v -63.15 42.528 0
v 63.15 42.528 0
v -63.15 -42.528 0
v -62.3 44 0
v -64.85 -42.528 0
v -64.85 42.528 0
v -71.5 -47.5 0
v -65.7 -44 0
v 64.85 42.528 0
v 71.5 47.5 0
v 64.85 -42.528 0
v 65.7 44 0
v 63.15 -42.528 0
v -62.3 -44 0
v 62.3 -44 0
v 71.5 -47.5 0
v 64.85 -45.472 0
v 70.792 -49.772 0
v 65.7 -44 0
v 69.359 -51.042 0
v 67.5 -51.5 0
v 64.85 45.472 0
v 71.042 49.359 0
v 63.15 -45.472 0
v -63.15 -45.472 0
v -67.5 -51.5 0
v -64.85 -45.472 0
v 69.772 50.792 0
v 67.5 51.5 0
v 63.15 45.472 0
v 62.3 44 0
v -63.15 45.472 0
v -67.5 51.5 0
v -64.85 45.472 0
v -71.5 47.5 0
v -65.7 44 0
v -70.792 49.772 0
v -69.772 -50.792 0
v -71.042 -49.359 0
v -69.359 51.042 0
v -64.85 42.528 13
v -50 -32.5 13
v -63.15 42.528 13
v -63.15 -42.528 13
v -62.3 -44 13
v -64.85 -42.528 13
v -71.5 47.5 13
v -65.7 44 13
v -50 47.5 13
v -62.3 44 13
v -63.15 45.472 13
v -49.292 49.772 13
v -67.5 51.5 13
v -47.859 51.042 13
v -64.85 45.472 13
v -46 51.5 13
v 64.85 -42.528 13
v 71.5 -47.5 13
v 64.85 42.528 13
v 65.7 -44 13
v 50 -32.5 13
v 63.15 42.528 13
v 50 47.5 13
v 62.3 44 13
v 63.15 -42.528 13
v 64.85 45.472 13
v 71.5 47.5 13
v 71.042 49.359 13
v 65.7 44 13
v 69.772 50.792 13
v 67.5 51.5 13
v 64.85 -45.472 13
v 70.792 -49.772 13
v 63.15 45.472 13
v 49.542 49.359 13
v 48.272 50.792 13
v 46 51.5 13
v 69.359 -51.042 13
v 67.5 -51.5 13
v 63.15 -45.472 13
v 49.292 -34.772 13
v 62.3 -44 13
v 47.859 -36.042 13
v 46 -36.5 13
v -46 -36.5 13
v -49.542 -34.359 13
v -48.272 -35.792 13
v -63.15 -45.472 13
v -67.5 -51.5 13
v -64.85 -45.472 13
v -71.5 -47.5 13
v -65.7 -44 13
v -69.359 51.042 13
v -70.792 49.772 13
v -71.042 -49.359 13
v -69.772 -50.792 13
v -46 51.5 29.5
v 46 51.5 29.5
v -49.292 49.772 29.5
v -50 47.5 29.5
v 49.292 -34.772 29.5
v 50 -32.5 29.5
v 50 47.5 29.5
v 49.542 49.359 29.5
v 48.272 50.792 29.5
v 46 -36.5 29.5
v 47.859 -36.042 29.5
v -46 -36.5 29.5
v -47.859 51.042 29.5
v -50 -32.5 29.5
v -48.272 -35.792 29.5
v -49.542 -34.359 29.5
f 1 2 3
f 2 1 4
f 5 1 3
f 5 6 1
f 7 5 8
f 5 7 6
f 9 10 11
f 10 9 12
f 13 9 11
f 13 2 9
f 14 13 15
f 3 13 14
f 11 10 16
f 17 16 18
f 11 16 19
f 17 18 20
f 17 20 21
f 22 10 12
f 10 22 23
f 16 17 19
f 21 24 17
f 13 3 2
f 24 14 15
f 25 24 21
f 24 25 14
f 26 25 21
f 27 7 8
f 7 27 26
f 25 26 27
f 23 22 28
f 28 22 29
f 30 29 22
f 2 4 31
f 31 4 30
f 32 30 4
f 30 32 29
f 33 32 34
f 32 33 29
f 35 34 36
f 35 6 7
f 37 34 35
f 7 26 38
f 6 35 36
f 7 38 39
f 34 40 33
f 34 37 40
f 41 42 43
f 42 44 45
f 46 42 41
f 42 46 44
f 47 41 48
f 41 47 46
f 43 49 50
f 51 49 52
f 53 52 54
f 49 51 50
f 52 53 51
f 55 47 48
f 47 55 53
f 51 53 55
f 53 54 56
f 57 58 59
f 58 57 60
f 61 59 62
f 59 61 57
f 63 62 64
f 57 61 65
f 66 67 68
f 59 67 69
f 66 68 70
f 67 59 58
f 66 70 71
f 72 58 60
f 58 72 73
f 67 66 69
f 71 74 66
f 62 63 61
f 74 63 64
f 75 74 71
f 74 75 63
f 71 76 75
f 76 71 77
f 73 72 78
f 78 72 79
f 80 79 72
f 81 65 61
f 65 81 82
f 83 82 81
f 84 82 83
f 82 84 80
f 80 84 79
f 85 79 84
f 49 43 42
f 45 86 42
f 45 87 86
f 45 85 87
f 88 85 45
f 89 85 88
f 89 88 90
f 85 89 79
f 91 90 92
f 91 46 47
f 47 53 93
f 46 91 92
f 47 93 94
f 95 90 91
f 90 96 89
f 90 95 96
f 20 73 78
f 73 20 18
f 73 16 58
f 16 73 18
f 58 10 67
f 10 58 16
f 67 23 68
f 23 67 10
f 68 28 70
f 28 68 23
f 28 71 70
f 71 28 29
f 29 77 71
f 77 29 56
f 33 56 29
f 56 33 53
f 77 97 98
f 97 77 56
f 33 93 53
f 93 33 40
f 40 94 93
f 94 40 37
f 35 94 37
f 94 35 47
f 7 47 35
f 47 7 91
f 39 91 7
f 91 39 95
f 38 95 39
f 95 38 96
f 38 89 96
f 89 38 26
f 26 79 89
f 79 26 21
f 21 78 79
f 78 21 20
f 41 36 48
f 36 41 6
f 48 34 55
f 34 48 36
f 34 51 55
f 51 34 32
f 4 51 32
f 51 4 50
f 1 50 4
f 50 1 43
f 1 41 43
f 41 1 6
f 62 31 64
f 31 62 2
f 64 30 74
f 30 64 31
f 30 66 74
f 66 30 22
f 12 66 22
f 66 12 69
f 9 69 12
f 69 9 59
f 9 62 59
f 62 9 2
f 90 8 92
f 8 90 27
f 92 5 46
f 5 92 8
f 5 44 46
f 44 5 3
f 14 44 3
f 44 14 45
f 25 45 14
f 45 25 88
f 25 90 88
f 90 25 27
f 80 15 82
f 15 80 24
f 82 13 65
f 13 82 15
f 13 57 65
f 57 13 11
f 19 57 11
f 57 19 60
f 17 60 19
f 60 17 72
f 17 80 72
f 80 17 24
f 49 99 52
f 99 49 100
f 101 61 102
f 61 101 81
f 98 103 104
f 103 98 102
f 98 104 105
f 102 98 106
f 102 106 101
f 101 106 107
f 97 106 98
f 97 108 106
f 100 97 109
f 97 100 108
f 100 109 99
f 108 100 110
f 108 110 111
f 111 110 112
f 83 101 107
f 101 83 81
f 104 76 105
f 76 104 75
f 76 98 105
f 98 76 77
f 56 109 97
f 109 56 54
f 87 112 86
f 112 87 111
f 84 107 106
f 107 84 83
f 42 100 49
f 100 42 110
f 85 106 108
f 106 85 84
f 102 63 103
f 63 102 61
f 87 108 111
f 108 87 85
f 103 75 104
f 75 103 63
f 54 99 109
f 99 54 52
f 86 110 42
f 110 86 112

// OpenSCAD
module RevExpansionHub()
{
	color(0.4*[1,1,1])
	{
	linear_extrude(13)
	difference()
	{
		offset(4)
		square([143-8,103-8],center=true);
		for (t=[[-64,-44],[-64,44],[64,-44],[64,44]])
		{
			translate(t)
			circle(1.7);
		}
	}
	linear_extrude(29.5)
	translate([-46,103/2-88+4])
	offset(4)
	square([100-8,88-8]);
	}
}

RevExpansionHub();
